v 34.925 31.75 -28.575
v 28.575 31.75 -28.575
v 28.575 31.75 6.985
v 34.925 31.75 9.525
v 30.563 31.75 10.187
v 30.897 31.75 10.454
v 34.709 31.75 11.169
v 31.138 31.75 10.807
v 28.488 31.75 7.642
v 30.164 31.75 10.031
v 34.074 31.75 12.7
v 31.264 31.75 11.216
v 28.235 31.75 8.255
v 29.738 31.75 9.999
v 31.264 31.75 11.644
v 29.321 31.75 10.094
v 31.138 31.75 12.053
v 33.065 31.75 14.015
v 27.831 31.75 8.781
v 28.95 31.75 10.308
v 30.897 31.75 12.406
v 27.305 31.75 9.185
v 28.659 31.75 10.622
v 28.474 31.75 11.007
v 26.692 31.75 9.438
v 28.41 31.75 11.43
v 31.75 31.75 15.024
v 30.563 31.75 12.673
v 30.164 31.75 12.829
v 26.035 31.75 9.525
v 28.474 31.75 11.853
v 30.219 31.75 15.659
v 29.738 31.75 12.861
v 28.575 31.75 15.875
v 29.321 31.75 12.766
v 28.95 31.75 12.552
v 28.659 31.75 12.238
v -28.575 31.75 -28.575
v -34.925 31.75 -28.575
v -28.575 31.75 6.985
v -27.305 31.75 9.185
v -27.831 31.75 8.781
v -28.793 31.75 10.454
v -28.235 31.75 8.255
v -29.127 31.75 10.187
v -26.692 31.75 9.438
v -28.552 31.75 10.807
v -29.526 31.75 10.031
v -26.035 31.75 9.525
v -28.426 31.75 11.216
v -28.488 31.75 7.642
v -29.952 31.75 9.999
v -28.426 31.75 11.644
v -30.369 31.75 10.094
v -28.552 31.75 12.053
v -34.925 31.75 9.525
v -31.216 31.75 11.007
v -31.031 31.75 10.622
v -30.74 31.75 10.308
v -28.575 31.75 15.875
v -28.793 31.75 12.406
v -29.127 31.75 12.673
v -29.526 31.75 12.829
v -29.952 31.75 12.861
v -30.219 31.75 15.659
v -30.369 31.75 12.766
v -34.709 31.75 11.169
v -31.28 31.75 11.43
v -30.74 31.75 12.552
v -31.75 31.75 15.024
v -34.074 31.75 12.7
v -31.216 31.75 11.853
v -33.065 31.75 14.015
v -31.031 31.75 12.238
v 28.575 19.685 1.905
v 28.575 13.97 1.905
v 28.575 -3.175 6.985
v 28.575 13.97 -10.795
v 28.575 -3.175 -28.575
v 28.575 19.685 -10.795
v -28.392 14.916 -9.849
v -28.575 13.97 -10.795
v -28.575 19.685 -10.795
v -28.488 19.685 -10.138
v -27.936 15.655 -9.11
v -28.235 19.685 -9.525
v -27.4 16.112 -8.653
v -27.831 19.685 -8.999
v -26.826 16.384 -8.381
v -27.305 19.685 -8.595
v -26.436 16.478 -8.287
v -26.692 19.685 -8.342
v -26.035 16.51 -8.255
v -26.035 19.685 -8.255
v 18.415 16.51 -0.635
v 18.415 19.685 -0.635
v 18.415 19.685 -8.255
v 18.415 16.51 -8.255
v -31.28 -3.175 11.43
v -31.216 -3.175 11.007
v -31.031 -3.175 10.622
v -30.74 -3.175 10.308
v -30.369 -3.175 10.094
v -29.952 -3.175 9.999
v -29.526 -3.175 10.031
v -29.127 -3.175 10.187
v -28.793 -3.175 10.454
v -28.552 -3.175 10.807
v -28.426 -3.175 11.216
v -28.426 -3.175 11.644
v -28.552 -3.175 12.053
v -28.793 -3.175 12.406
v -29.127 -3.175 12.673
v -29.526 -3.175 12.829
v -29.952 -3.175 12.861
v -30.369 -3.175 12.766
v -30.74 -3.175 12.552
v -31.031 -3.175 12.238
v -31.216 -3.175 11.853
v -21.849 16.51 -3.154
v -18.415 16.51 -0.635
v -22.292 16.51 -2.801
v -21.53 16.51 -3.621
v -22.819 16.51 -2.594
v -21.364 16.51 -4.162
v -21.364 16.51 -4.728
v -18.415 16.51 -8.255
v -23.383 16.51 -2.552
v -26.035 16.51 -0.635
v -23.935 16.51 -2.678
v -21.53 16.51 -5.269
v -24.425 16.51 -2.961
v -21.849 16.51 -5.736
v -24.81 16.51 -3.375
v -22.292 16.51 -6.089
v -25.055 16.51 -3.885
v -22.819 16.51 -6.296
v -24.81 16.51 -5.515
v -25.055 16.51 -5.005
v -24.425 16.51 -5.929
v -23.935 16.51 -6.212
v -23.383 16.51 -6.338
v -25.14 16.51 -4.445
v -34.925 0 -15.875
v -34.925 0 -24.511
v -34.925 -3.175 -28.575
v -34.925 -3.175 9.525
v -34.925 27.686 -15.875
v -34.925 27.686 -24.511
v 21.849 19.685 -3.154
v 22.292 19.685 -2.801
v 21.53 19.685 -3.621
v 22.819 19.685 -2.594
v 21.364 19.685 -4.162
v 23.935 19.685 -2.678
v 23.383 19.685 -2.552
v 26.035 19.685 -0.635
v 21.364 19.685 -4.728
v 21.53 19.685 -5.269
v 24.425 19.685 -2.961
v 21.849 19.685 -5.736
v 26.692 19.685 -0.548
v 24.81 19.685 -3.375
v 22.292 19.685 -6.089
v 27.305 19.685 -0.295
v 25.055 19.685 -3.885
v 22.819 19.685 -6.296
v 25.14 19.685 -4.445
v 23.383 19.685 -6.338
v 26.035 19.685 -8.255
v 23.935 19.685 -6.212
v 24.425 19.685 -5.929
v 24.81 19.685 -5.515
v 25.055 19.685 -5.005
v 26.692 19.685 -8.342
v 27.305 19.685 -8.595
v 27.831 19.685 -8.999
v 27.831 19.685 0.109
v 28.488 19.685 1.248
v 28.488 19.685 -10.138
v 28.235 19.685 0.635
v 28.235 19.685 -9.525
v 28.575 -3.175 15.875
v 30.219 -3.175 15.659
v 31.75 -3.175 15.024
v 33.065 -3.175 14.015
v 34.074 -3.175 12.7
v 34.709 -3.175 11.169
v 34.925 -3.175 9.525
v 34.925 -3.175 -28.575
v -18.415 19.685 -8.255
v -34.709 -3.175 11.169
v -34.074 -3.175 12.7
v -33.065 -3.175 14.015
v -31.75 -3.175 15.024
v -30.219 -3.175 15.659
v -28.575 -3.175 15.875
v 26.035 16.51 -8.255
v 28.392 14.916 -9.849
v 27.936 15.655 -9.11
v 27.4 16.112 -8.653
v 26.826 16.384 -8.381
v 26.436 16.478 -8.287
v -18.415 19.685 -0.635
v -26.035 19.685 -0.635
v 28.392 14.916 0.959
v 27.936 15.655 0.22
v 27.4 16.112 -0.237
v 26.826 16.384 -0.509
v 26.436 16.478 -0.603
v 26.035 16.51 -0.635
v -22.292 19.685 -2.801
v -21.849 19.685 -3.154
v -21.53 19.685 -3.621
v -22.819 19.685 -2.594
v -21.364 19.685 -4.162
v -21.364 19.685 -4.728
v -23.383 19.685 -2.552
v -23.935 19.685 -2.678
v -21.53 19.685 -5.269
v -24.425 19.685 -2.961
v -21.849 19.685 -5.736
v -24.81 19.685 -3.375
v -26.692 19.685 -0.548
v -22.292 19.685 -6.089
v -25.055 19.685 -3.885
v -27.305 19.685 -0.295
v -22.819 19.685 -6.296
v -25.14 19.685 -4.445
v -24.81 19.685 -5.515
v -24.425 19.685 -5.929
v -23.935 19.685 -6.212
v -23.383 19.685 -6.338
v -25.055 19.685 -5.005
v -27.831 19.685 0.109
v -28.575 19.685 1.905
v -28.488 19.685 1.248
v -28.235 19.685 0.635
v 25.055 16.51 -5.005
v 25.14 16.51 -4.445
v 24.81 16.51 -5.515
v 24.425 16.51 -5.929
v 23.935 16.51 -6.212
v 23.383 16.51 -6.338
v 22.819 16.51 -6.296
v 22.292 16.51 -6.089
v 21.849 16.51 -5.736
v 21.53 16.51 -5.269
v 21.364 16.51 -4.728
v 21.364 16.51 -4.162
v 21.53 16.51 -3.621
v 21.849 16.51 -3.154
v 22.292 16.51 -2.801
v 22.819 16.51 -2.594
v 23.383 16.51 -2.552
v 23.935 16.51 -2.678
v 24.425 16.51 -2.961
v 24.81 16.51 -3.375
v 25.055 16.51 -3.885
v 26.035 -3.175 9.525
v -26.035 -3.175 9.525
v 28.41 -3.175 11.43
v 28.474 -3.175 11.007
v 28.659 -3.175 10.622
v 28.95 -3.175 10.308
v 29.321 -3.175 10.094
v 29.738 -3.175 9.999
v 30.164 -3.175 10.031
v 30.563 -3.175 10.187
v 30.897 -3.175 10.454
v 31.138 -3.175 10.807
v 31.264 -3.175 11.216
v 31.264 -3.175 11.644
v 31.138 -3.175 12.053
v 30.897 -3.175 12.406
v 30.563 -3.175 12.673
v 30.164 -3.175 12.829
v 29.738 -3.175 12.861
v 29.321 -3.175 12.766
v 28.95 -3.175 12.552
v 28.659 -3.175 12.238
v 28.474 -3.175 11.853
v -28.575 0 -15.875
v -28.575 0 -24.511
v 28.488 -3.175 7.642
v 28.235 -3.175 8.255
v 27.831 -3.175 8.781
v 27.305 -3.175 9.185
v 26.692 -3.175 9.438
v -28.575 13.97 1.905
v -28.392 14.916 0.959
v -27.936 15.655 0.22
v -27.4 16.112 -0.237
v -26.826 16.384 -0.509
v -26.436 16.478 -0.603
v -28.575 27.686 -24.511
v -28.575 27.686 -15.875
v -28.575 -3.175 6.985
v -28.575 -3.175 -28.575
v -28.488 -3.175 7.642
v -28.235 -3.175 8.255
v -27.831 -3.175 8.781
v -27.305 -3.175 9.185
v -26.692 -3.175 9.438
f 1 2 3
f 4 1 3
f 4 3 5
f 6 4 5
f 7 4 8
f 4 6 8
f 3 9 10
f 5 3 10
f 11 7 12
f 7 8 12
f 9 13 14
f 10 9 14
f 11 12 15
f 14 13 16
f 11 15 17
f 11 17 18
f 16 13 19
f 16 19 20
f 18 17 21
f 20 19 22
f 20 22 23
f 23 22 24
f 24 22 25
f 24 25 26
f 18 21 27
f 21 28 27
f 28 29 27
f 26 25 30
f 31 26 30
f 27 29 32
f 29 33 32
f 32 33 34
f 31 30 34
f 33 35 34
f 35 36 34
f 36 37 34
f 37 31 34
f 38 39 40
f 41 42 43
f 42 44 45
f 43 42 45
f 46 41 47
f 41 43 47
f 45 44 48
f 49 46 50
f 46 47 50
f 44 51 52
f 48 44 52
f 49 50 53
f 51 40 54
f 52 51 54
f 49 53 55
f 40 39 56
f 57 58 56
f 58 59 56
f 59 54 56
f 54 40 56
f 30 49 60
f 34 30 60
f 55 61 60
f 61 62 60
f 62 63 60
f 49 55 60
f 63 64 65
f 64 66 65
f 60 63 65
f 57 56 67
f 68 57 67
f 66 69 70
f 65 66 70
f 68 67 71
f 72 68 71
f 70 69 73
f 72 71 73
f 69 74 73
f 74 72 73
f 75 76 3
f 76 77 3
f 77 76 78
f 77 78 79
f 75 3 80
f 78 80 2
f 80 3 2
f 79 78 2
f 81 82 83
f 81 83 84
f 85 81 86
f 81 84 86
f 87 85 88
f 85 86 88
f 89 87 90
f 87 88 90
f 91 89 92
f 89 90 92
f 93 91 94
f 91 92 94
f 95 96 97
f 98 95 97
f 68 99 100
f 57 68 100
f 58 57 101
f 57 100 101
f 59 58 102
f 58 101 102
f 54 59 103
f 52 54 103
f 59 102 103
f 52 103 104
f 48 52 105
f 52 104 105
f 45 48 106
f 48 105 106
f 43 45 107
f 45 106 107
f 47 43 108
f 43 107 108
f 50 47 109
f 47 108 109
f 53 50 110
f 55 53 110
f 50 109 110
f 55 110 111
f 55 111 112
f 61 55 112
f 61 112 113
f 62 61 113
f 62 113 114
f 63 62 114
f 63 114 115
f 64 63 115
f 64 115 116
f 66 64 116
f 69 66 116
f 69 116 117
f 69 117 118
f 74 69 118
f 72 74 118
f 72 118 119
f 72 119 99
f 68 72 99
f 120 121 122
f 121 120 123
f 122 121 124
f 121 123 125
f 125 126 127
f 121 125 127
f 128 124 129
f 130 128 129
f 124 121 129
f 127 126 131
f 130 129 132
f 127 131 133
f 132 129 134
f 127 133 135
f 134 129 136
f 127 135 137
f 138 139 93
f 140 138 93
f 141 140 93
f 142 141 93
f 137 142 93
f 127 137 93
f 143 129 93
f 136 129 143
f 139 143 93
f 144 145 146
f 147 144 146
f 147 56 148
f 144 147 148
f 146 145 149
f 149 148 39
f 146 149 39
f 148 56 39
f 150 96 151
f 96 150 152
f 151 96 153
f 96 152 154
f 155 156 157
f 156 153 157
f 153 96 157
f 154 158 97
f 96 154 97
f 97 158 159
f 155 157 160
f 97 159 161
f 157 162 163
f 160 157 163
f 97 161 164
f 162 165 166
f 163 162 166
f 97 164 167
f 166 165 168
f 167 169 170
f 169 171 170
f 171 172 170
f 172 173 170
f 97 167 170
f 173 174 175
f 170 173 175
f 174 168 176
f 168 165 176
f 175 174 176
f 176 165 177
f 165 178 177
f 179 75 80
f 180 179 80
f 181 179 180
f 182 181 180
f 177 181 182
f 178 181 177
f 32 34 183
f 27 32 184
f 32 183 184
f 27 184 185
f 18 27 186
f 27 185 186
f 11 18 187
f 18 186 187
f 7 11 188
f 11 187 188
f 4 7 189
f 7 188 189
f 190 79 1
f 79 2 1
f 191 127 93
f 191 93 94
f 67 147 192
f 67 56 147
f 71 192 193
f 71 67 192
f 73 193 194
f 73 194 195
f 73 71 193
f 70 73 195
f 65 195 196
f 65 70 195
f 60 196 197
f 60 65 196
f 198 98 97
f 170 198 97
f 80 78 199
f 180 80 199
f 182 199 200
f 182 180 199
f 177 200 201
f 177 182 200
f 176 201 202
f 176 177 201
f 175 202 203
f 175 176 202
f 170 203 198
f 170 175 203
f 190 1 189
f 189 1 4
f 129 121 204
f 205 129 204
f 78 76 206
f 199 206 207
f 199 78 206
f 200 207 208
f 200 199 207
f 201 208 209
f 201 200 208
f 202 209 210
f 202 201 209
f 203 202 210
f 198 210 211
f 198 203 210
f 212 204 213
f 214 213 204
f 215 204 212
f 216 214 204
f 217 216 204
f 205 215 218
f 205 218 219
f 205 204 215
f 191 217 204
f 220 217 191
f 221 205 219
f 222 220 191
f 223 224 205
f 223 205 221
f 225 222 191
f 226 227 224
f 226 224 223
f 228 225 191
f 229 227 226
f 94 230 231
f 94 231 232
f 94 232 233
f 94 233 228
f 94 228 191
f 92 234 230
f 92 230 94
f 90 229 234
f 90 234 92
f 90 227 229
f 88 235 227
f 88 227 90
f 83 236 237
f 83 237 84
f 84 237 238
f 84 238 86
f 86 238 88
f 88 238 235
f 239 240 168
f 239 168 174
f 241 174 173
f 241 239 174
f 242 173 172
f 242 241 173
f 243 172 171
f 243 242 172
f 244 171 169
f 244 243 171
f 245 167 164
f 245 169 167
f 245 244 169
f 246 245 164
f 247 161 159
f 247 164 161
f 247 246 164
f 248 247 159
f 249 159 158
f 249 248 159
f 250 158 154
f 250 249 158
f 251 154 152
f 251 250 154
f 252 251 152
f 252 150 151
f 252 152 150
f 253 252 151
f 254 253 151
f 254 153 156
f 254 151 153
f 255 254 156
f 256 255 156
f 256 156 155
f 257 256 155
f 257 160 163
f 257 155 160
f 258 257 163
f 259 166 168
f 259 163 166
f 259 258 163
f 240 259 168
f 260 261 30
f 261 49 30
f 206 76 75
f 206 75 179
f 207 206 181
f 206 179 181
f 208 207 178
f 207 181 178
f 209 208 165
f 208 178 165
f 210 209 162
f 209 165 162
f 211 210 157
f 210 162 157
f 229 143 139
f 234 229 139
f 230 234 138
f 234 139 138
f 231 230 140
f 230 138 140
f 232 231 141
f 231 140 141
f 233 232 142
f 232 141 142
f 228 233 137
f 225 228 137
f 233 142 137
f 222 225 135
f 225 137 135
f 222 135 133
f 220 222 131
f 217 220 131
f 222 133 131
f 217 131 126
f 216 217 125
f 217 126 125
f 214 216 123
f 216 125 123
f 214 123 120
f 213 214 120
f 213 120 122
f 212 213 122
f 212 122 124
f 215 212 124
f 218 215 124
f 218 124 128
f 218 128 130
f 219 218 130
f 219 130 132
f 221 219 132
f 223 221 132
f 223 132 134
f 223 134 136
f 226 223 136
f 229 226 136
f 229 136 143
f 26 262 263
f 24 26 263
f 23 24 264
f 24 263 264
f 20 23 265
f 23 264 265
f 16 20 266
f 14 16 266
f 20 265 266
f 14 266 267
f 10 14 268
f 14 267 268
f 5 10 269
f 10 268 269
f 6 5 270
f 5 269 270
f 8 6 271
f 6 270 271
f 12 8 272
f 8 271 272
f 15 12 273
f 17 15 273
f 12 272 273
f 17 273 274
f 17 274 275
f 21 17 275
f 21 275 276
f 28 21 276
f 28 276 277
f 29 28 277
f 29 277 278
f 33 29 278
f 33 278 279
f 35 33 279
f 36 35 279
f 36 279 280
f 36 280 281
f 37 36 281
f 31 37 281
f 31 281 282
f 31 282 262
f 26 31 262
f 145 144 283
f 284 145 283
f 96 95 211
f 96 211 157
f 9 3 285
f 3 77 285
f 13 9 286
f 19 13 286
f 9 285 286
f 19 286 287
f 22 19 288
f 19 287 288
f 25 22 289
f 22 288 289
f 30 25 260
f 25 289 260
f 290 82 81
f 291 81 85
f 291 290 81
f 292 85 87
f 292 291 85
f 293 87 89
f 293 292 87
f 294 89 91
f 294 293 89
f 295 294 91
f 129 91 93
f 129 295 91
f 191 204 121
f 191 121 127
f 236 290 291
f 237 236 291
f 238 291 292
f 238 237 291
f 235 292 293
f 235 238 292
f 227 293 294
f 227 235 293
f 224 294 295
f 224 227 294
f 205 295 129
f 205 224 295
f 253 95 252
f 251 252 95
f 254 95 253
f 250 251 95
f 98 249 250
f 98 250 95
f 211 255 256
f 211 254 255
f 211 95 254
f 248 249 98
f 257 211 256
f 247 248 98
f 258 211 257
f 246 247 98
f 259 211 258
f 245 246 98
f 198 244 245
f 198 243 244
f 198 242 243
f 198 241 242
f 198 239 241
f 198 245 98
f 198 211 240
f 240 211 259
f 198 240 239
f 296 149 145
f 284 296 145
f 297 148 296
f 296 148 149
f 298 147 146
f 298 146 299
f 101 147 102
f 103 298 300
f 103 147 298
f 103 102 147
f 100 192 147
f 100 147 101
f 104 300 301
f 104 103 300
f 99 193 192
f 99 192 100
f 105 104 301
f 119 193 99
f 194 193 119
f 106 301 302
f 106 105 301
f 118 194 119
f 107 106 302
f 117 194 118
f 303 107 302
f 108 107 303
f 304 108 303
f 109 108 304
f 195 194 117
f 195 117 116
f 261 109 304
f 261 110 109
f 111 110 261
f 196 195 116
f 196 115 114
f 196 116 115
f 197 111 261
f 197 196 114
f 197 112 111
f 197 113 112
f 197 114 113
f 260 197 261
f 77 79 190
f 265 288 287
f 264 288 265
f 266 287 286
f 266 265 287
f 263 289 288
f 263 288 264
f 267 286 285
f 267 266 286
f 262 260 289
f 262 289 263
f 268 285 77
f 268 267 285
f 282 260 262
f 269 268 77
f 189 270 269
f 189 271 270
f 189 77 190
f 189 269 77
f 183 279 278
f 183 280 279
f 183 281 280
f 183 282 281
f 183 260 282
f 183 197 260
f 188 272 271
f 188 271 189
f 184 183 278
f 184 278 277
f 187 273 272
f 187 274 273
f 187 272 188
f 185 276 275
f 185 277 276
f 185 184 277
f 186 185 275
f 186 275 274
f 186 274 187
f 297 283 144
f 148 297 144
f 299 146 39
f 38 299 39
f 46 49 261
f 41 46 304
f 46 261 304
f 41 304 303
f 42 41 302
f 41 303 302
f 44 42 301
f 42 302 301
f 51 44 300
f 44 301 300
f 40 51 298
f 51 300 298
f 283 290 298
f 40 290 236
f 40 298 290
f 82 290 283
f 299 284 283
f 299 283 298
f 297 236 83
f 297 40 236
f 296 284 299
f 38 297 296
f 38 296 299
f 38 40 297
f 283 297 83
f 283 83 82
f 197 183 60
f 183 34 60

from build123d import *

# Parameters (mm, degrees)
BOSS_EXTRUDE1_DEPTH       = 31.75
SKETCH5_W                 = 7.62
SKETCH5_H                 = 3.175
BOSS_EXTRUDE2_DEPTH       = 10.16
F_6_CLEARANCE_HOLE1_D     = 3.7973
BOSS_EXTRUDE3_DEPTH       = 3.175
FILLET1_R                 = 6.35
FILLET2_R                 = 2.54
FILLET3_R                 = 2.54
FILLET4_R                 = 2.54
F_6_40_TAPPED_HOLE1_D     = 2.8702
F_6_40_TAPPED_HOLE1_DEPTH = 38.1
F_6_40_TAPPED_HOLE1_TIP   = 0.862295074
BOSS_EXTRUDE5_DEPTH       = 6.35


with BuildPart() as part:
    # Sketch1 → Boss-Extrude1 (new body)
    with BuildSketch(Plane(origin=(0, 0, 0), x_dir=(1, 0, 0), z_dir=(0, 1, 0))):
        Polygon((-34.925, -15.875), (34.925, -15.875), (34.925, 15.875), (34.925, 28.575), (28.575, 28.575), (28.575, 15.875), (28.575, -9.525), (-28.575, -9.525), (-28.575, 15.875), (-34.925, 15.875), align=None)
    extrude(amount=BOSS_EXTRUDE1_DEPTH)

    # Sketch5 → Boss-Extrude2 (add)
    with BuildSketch(Plane(origin=(-28.575, 0, 0), x_dir=(0, 0, -1), z_dir=(1, 0, 0))):
        with Locations((4.445, 18.0975)):
            Rectangle(SKETCH5_W, SKETCH5_H)
    boss_extrude2 = extrude(amount=BOSS_EXTRUDE2_DEPTH)

    # #6 Clearance Hole1 (through all)
    with Locations(Plane(origin=(0, 19.685, 0), x_dir=(1, 0, 0), z_dir=(0, 1, 0))):
        with Locations((-23.241, 4.445)):
            f_6_clearance_hole1 = Hole(F_6_CLEARANCE_HOLE1_D / 2)

    # Mirror4: Boss-Extrude2, #6 Clearance Hole1 across plane
    add(boss_extrude2.mirror(Plane(origin=(0, 0, 0), x_dir=(0, 0, 1), z_dir=(1, 0, 0))))
    add(f_6_clearance_hole1.mirror(Plane(origin=(0, 0, 0), x_dir=(0, 0, 1), z_dir=(1, 0, 0))), mode=Mode.SUBTRACT)

    # Sketch11 → Boss-Extrude3 (add)
    with BuildSketch(Plane.XZ):
        Polygon((-28.575, -28.575), (-28.575, 9.525), (28.575, 9.525), (28.575, -28.575), (34.925, -28.575), (34.925, 15.875), (-34.925, 15.875), (-34.925, -28.575), align=None)
    extrude(amount=BOSS_EXTRUDE3_DEPTH)

    # Fillet1
    fillet1_edges = [part.edges().sort_by_distance(p)[0] for p in [
        (34.925, 14.2875, 15.875),
        (-34.925, 14.2875, 15.875),
    ]]
    fillet(fillet1_edges, radius=FILLET1_R)

    # Fillet2
    fillet2_edges = [part.edges().sort_by_distance(p)[0] for p in [
        (-28.575, 18.0975, -8.255),
        (-28.575, 18.0975, -0.635),
        (28.575, 18.0975, -0.635),
        (28.575, 18.0975, -8.255),
    ]]
    fillet(fillet2_edges, radius=FILLET2_R)

    # Fillet3
    fillet3_edges = [part.edges().sort_by_distance(p)[0] for p in [
        (-28.575, 16.51, -4.445),
        (28.575, 16.51, -4.445),
    ]]
    fillet(fillet3_edges, radius=FILLET3_R)

    # Fillet4
    fillet4_edges = [part.edges().sort_by_distance(p)[0] for p in [
        (-28.575, 14.2875, 9.525),
        (28.575, 14.2875, 9.525),
    ]]
    fillet(fillet4_edges, radius=FILLET4_R)

    # #6-40 Tapped Hole1
    with Locations(Plane(origin=(0, 31.75, 0), x_dir=(1, 0, 0), z_dir=(0, 1, 0))):
        with Locations((29.845, -11.43), (-29.845, -11.43)):
            Hole(F_6_40_TAPPED_HOLE1_D / 2, depth=F_6_40_TAPPED_HOLE1_DEPTH)
            with Locations((0, 0, -(F_6_40_TAPPED_HOLE1_DEPTH + F_6_40_TAPPED_HOLE1_TIP / 2))):  # 118° drill point
                Cone(0, F_6_40_TAPPED_HOLE1_D / 2, F_6_40_TAPPED_HOLE1_TIP, mode=Mode.SUBTRACT)

    # Sketch17 → Boss-Extrude5 (add)
    with BuildSketch(Plane.ZY.offset(34.925)):
        Polygon((-28.575, 0), (-28.575, 31.75), (-15.875, 31.75), (-15.875, 27.686), (-24.511, 27.686), (-24.511, 0), align=None)
    extrude(amount=-BOSS_EXTRUDE5_DEPTH)


solid = part.part
